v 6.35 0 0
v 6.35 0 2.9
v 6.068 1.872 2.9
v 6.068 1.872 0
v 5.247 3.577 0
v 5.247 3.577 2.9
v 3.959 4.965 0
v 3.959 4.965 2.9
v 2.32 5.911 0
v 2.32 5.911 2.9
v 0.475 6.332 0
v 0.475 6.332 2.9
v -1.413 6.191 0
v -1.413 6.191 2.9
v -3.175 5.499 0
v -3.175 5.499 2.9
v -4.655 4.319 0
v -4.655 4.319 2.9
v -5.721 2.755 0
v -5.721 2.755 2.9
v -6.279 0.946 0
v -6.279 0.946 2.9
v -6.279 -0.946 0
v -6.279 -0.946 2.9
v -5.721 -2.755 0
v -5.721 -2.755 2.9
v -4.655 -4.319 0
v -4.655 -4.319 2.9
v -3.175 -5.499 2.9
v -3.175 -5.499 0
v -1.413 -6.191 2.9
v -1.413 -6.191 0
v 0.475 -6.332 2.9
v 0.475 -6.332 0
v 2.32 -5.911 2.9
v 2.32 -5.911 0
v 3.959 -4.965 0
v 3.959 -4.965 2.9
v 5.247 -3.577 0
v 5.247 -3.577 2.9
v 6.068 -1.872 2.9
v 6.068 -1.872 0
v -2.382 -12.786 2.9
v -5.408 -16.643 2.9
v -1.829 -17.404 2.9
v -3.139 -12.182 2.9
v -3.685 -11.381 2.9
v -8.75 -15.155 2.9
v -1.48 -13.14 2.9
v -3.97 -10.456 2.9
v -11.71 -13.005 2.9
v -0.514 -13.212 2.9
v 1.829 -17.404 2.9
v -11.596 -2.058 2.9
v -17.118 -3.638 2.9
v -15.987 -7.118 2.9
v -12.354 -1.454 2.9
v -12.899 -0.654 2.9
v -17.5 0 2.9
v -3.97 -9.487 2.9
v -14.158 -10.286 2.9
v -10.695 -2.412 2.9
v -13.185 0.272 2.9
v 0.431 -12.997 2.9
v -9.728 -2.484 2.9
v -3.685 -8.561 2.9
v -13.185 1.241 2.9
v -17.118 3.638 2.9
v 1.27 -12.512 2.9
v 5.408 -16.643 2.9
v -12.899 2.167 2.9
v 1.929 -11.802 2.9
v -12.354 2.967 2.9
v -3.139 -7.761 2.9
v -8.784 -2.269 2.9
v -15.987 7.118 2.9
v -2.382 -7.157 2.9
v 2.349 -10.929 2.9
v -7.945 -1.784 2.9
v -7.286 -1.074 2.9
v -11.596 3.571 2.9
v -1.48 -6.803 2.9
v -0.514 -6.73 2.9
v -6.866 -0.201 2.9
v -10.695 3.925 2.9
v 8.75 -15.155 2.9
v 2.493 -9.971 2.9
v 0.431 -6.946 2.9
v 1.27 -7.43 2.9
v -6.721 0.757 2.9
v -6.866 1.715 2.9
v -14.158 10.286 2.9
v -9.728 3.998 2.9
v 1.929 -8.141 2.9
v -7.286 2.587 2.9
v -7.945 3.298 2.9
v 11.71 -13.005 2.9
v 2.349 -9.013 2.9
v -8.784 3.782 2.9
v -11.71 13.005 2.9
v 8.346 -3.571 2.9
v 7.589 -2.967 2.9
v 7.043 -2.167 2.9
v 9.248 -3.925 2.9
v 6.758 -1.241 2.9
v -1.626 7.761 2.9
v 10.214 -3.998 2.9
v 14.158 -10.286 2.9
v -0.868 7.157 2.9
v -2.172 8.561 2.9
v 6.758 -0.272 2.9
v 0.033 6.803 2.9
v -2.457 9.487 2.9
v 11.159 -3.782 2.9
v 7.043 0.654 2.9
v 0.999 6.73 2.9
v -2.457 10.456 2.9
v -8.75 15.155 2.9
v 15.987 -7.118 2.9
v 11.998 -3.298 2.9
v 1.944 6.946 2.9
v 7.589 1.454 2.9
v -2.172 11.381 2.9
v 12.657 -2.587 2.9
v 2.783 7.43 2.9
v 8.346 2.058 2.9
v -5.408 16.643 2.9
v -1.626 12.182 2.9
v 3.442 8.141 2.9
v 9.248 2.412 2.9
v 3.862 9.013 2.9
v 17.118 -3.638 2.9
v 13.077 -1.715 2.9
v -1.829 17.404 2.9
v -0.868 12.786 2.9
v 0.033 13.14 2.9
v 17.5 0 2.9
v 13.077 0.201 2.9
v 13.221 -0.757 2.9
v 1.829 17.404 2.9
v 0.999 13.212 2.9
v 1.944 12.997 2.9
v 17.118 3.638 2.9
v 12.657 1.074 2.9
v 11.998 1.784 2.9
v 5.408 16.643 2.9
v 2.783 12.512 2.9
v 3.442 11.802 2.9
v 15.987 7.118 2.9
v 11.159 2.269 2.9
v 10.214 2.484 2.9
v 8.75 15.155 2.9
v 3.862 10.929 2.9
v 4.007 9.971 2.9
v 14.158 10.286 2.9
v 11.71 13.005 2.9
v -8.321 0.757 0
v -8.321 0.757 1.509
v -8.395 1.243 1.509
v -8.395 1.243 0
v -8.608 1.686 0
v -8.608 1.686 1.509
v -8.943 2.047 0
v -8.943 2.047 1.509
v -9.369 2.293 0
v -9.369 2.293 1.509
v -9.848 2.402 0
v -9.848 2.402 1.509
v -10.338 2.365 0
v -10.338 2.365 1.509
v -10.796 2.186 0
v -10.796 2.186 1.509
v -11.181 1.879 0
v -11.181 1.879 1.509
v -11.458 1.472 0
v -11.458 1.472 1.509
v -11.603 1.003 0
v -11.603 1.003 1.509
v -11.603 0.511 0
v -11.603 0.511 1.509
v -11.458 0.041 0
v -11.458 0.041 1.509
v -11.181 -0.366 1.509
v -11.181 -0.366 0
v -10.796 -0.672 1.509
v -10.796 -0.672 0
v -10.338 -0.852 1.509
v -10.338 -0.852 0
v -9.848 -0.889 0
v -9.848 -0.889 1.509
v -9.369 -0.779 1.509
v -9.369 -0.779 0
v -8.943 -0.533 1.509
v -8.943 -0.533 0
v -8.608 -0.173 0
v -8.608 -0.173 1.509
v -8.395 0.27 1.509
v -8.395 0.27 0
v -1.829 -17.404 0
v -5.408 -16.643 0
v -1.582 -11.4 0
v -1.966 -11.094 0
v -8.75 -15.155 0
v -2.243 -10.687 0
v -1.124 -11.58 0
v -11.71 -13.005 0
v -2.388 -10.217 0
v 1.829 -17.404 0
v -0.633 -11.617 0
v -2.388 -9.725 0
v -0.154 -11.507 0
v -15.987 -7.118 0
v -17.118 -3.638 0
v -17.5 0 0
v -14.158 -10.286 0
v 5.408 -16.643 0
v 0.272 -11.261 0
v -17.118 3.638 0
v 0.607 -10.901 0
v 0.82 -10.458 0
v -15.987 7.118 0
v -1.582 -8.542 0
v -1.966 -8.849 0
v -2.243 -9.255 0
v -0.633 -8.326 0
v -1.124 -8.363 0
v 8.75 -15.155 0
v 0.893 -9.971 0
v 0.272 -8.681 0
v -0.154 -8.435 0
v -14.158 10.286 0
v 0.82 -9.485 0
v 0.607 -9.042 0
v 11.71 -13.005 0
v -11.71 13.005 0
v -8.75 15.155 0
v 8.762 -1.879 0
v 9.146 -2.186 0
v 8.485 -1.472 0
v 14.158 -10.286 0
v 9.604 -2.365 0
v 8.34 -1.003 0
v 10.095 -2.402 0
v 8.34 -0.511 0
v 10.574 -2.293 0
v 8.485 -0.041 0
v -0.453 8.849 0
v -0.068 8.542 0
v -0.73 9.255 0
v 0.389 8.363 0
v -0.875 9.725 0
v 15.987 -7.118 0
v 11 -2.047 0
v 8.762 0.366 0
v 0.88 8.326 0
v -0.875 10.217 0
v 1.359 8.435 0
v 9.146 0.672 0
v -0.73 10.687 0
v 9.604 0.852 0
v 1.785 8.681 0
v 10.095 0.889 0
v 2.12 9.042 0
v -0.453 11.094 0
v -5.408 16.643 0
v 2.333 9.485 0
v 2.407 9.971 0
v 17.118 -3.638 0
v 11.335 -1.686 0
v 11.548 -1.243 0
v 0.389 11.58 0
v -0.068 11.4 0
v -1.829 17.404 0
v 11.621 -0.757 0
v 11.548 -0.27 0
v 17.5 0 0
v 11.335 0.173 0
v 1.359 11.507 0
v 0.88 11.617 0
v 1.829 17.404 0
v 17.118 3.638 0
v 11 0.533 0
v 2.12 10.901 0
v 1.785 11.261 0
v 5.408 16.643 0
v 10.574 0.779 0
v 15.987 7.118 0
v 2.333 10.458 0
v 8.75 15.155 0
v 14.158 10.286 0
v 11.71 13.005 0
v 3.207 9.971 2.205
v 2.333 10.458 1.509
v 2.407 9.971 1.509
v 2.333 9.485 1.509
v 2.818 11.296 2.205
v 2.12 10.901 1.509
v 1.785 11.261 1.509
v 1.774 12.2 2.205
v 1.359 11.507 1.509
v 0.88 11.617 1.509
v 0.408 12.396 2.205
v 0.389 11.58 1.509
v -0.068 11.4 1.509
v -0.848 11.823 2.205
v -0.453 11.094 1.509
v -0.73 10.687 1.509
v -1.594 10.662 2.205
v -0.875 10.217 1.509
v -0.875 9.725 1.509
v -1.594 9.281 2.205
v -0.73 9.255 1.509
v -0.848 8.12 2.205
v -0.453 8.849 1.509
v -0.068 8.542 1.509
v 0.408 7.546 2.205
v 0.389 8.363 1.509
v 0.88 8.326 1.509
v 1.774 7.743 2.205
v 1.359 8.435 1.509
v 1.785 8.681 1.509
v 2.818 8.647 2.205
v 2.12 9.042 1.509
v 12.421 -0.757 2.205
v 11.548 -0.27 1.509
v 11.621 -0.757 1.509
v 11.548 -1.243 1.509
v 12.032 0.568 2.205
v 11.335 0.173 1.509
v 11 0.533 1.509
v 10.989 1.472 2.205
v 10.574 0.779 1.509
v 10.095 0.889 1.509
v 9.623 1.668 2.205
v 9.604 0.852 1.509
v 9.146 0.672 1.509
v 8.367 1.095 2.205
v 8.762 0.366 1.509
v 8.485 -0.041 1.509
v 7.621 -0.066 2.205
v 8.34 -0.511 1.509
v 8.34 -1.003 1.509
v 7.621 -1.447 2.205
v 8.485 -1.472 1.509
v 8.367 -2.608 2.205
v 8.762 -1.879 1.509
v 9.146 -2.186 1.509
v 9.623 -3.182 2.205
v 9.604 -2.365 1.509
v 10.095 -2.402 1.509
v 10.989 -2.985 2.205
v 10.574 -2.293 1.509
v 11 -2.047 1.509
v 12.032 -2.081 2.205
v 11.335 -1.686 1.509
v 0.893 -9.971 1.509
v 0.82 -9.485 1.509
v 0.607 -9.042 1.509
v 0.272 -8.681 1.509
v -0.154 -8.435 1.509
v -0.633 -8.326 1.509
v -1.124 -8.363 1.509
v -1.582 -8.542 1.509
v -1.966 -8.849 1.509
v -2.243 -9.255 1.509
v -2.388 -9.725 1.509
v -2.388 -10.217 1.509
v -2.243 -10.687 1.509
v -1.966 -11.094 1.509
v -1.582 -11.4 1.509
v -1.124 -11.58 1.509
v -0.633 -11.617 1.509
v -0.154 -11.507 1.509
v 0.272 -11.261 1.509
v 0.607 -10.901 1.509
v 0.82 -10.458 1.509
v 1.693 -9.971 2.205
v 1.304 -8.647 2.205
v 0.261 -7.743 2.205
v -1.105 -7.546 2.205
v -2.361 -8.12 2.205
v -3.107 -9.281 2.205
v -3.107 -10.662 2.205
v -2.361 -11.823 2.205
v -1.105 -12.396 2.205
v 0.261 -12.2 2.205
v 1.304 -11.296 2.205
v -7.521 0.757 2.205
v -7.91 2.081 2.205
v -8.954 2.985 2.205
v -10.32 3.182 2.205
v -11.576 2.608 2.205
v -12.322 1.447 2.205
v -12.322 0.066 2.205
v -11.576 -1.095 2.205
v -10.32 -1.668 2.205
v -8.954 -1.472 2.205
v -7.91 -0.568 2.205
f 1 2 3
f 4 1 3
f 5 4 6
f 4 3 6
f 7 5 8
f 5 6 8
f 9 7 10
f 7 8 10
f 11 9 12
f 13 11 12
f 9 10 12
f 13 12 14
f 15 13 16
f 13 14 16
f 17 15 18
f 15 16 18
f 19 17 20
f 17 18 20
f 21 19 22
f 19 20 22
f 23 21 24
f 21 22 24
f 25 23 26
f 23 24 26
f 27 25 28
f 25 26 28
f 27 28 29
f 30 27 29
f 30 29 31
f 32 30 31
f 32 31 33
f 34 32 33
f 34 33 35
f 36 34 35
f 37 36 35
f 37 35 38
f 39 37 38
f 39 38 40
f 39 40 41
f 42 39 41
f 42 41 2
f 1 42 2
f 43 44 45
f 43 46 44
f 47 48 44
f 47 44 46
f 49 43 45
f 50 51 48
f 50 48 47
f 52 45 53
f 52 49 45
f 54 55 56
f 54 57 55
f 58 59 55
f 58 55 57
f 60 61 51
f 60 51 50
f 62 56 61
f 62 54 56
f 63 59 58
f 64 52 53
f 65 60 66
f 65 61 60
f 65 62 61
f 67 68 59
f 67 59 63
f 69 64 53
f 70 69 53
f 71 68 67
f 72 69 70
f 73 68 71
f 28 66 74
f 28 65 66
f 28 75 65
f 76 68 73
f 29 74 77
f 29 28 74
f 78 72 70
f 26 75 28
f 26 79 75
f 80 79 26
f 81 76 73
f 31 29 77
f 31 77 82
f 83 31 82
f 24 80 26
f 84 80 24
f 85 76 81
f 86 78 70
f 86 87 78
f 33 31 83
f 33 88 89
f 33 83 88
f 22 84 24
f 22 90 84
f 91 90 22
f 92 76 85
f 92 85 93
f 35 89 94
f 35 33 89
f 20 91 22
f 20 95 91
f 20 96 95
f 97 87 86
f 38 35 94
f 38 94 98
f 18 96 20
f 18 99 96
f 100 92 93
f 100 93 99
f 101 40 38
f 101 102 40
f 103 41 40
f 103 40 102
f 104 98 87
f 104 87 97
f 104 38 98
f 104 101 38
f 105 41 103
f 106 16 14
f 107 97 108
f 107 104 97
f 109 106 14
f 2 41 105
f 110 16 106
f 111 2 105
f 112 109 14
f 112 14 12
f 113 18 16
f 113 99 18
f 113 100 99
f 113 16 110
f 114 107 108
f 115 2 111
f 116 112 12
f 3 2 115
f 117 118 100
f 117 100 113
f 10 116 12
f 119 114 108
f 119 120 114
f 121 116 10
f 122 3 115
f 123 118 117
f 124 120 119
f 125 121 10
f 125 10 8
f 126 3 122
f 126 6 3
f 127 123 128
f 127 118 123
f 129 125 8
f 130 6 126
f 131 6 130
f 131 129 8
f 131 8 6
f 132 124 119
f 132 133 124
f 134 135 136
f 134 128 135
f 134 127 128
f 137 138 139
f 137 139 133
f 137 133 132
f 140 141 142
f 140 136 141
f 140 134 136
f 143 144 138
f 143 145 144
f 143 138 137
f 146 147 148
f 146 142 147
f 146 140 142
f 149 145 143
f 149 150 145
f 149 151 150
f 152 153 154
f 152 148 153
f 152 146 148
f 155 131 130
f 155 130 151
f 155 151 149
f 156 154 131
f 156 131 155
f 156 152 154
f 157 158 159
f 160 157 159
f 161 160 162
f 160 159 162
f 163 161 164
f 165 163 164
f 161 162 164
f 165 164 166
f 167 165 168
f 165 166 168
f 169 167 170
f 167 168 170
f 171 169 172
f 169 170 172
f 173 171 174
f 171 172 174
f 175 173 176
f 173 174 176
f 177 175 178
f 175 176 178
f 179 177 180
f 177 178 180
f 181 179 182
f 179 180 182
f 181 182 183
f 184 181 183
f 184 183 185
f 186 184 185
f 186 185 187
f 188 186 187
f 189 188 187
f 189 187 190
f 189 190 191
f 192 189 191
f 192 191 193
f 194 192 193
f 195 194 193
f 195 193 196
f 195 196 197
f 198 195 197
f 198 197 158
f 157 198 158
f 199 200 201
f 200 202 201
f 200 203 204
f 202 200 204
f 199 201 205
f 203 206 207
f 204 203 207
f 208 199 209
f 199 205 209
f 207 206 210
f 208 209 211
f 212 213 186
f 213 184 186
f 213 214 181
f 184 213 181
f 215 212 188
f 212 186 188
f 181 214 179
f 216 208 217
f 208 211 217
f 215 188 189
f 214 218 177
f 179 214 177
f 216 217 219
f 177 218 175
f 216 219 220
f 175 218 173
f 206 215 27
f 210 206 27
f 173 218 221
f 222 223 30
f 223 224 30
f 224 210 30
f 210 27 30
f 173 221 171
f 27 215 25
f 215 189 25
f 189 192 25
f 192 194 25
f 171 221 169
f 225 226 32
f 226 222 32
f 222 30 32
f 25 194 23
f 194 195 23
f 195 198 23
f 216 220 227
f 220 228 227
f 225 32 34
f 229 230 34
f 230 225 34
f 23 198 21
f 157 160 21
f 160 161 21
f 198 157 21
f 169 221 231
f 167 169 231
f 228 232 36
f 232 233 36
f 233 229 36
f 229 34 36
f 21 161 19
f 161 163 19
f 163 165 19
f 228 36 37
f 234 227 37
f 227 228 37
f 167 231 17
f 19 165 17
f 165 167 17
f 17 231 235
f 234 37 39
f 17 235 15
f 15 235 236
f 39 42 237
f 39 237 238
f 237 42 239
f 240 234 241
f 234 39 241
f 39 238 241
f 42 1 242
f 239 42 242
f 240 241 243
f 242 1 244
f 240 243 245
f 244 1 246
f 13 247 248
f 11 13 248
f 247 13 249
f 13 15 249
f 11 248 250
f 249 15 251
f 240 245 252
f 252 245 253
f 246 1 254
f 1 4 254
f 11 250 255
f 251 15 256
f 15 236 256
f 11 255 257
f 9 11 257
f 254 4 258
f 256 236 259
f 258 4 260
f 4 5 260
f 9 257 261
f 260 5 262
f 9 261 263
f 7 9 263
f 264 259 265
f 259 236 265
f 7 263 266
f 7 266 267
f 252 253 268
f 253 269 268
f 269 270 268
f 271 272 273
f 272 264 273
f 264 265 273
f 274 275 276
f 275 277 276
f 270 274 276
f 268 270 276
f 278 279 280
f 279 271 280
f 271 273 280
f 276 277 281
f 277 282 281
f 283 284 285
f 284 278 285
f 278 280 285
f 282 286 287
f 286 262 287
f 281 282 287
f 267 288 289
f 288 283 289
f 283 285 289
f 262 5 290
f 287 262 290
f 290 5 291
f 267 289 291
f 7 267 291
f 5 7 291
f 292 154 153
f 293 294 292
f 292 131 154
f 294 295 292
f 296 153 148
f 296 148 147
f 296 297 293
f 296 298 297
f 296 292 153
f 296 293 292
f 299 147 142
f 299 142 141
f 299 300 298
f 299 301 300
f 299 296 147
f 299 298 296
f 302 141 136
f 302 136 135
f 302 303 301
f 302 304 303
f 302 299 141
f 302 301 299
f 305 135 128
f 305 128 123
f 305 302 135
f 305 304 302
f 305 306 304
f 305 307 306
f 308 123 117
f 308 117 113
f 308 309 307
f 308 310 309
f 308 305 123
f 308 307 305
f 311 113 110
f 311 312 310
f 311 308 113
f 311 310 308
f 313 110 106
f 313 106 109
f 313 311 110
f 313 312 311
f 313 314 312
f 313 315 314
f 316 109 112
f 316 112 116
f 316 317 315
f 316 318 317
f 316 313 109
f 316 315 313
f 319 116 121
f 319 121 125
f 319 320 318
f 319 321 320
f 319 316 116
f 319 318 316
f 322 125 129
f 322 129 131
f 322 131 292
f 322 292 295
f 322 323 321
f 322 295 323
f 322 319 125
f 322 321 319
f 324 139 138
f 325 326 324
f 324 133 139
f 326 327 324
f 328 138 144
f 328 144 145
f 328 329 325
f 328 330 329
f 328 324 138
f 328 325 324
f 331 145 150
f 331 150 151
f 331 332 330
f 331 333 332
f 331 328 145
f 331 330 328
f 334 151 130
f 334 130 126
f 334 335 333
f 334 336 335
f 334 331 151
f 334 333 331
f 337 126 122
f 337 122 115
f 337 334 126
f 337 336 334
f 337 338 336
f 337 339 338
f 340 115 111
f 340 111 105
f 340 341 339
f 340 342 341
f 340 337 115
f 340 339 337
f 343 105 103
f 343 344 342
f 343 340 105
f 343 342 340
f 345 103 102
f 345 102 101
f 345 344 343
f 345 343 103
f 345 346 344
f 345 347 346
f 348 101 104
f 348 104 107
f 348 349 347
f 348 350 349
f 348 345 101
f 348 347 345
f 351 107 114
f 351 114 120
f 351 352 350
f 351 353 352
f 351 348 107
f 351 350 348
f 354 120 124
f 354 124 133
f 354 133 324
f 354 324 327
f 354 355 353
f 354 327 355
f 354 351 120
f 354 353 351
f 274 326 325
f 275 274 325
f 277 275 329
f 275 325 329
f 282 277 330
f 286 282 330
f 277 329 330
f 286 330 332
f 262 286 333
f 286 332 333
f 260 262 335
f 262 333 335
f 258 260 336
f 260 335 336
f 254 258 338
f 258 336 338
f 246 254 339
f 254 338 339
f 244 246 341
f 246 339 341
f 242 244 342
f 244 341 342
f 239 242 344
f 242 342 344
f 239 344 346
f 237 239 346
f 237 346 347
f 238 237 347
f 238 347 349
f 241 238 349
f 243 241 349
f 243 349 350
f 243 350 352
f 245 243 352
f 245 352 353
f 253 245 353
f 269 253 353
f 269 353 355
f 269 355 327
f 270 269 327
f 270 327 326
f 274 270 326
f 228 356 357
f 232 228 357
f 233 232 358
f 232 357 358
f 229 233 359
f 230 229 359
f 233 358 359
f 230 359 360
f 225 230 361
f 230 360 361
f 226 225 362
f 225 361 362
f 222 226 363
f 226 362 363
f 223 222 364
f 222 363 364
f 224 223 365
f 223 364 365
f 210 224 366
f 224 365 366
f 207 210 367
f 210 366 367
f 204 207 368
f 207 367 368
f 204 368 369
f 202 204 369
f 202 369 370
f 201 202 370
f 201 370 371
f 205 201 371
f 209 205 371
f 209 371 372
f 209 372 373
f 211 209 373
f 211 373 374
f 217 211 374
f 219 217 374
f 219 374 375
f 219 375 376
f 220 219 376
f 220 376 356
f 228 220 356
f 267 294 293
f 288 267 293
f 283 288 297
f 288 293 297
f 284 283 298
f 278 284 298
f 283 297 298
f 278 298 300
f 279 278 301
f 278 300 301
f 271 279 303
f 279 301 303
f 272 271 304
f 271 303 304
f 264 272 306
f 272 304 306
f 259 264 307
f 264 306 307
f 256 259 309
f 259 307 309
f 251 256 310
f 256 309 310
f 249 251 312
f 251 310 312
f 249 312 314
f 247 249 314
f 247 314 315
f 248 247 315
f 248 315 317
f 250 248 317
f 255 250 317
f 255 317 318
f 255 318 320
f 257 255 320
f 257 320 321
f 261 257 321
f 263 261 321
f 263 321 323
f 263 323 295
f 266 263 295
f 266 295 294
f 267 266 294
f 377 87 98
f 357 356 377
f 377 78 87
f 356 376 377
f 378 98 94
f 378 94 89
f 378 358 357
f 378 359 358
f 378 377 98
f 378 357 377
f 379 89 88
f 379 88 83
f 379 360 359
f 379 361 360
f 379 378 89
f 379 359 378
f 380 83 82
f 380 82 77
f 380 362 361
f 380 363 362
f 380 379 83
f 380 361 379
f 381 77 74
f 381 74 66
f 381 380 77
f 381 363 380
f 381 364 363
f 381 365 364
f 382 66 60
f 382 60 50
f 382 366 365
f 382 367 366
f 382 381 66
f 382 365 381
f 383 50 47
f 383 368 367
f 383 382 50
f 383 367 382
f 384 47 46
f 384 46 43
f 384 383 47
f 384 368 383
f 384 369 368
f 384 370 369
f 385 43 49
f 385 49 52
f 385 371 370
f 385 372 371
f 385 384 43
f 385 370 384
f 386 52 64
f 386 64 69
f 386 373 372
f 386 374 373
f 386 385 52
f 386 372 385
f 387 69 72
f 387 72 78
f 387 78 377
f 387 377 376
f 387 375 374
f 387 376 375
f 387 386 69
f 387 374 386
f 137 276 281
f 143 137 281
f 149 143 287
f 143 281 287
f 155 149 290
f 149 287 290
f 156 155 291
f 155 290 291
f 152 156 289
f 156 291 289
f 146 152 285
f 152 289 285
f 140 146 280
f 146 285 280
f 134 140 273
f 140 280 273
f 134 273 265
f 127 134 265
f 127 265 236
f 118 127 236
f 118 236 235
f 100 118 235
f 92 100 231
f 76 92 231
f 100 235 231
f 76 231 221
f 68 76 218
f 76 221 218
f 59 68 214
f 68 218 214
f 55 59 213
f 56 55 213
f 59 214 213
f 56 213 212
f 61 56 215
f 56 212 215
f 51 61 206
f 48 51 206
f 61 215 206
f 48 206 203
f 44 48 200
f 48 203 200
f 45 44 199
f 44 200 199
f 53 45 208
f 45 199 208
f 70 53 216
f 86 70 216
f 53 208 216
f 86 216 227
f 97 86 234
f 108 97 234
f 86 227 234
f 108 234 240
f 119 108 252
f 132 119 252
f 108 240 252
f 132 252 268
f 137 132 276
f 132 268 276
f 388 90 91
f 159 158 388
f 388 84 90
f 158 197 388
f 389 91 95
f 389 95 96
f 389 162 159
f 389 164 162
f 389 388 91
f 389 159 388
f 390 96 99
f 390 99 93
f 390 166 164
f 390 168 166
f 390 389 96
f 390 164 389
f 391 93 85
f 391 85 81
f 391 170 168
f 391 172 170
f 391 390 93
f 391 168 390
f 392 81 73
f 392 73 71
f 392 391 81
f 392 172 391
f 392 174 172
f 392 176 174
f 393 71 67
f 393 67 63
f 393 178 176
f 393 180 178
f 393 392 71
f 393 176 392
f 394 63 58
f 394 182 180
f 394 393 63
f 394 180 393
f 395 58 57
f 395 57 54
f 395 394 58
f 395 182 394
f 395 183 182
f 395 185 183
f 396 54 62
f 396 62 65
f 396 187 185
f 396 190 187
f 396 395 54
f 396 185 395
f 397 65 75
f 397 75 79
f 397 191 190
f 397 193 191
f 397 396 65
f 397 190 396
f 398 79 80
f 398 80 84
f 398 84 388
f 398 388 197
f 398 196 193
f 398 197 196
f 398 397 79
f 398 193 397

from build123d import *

# Parameters (mm, degrees)
SKETCH1_R           = 17.5
BOSS_EXTRUDE1_DEPTH = 2.9
SKETCH2_R           = 1.65
CUT_EXTRUDE1_DEPTH  = 25.918065736
CHAMFER1_SIZE       = 1.6
CHAMFER1_SIZE2      = 1.390858781
SKETCH3_R           = 6.35
CUT_EXTRUDE2_DEPTH  = 25.918065736


with BuildPart() as part:
    # Sketch1 → Boss-Extrude1 (new body)
    with BuildSketch(Plane.XY):
        Circle(SKETCH1_R)
    extrude(amount=BOSS_EXTRUDE1_DEPTH)

    # Sketch2 → Cut-Extrude1 (cut, through all)
    with BuildSketch(Plane.XY.offset(2.9)):
        with Locations((-9.971337593, 0.756588791)):
            Circle(SKETCH2_R)
        with Locations((-0.756588791, -9.971337593)):
            Circle(SKETCH2_R)
        with Locations((9.971337593, -0.756588791)):
            Circle(SKETCH2_R)
        with Locations((0.756588791, 9.971337593)):
            Circle(SKETCH2_R)
    extrude(amount=-CUT_EXTRUDE1_DEPTH, mode=Mode.SUBTRACT)

    # Chamfer1
    chamfer1_edges = [part.edges().sort_by_distance(p)[0] for p in [
        (-2.406588791, -9.971337593, 2.9),
        (8.321337593, -0.756588791, 2.9),
        (-0.893411209, 9.971337593, 2.9),
        (-11.621337593, 0.756588791, 2.9),
    ]]
    chamfer1_side = [part.faces().sort_by_distance(p)[0] for p in [
        (0, 0, 2.9),
    ]]
    chamfer(chamfer1_edges, length=CHAMFER1_SIZE, length2=CHAMFER1_SIZE2, reference=chamfer1_side[0])

    # Sketch3 → Cut-Extrude2 (cut, through all)
    with BuildSketch(Plane.XY.offset(2.9)):
        Circle(SKETCH3_R)
    extrude(amount=-CUT_EXTRUDE2_DEPTH, mode=Mode.SUBTRACT)


solid = part.part
